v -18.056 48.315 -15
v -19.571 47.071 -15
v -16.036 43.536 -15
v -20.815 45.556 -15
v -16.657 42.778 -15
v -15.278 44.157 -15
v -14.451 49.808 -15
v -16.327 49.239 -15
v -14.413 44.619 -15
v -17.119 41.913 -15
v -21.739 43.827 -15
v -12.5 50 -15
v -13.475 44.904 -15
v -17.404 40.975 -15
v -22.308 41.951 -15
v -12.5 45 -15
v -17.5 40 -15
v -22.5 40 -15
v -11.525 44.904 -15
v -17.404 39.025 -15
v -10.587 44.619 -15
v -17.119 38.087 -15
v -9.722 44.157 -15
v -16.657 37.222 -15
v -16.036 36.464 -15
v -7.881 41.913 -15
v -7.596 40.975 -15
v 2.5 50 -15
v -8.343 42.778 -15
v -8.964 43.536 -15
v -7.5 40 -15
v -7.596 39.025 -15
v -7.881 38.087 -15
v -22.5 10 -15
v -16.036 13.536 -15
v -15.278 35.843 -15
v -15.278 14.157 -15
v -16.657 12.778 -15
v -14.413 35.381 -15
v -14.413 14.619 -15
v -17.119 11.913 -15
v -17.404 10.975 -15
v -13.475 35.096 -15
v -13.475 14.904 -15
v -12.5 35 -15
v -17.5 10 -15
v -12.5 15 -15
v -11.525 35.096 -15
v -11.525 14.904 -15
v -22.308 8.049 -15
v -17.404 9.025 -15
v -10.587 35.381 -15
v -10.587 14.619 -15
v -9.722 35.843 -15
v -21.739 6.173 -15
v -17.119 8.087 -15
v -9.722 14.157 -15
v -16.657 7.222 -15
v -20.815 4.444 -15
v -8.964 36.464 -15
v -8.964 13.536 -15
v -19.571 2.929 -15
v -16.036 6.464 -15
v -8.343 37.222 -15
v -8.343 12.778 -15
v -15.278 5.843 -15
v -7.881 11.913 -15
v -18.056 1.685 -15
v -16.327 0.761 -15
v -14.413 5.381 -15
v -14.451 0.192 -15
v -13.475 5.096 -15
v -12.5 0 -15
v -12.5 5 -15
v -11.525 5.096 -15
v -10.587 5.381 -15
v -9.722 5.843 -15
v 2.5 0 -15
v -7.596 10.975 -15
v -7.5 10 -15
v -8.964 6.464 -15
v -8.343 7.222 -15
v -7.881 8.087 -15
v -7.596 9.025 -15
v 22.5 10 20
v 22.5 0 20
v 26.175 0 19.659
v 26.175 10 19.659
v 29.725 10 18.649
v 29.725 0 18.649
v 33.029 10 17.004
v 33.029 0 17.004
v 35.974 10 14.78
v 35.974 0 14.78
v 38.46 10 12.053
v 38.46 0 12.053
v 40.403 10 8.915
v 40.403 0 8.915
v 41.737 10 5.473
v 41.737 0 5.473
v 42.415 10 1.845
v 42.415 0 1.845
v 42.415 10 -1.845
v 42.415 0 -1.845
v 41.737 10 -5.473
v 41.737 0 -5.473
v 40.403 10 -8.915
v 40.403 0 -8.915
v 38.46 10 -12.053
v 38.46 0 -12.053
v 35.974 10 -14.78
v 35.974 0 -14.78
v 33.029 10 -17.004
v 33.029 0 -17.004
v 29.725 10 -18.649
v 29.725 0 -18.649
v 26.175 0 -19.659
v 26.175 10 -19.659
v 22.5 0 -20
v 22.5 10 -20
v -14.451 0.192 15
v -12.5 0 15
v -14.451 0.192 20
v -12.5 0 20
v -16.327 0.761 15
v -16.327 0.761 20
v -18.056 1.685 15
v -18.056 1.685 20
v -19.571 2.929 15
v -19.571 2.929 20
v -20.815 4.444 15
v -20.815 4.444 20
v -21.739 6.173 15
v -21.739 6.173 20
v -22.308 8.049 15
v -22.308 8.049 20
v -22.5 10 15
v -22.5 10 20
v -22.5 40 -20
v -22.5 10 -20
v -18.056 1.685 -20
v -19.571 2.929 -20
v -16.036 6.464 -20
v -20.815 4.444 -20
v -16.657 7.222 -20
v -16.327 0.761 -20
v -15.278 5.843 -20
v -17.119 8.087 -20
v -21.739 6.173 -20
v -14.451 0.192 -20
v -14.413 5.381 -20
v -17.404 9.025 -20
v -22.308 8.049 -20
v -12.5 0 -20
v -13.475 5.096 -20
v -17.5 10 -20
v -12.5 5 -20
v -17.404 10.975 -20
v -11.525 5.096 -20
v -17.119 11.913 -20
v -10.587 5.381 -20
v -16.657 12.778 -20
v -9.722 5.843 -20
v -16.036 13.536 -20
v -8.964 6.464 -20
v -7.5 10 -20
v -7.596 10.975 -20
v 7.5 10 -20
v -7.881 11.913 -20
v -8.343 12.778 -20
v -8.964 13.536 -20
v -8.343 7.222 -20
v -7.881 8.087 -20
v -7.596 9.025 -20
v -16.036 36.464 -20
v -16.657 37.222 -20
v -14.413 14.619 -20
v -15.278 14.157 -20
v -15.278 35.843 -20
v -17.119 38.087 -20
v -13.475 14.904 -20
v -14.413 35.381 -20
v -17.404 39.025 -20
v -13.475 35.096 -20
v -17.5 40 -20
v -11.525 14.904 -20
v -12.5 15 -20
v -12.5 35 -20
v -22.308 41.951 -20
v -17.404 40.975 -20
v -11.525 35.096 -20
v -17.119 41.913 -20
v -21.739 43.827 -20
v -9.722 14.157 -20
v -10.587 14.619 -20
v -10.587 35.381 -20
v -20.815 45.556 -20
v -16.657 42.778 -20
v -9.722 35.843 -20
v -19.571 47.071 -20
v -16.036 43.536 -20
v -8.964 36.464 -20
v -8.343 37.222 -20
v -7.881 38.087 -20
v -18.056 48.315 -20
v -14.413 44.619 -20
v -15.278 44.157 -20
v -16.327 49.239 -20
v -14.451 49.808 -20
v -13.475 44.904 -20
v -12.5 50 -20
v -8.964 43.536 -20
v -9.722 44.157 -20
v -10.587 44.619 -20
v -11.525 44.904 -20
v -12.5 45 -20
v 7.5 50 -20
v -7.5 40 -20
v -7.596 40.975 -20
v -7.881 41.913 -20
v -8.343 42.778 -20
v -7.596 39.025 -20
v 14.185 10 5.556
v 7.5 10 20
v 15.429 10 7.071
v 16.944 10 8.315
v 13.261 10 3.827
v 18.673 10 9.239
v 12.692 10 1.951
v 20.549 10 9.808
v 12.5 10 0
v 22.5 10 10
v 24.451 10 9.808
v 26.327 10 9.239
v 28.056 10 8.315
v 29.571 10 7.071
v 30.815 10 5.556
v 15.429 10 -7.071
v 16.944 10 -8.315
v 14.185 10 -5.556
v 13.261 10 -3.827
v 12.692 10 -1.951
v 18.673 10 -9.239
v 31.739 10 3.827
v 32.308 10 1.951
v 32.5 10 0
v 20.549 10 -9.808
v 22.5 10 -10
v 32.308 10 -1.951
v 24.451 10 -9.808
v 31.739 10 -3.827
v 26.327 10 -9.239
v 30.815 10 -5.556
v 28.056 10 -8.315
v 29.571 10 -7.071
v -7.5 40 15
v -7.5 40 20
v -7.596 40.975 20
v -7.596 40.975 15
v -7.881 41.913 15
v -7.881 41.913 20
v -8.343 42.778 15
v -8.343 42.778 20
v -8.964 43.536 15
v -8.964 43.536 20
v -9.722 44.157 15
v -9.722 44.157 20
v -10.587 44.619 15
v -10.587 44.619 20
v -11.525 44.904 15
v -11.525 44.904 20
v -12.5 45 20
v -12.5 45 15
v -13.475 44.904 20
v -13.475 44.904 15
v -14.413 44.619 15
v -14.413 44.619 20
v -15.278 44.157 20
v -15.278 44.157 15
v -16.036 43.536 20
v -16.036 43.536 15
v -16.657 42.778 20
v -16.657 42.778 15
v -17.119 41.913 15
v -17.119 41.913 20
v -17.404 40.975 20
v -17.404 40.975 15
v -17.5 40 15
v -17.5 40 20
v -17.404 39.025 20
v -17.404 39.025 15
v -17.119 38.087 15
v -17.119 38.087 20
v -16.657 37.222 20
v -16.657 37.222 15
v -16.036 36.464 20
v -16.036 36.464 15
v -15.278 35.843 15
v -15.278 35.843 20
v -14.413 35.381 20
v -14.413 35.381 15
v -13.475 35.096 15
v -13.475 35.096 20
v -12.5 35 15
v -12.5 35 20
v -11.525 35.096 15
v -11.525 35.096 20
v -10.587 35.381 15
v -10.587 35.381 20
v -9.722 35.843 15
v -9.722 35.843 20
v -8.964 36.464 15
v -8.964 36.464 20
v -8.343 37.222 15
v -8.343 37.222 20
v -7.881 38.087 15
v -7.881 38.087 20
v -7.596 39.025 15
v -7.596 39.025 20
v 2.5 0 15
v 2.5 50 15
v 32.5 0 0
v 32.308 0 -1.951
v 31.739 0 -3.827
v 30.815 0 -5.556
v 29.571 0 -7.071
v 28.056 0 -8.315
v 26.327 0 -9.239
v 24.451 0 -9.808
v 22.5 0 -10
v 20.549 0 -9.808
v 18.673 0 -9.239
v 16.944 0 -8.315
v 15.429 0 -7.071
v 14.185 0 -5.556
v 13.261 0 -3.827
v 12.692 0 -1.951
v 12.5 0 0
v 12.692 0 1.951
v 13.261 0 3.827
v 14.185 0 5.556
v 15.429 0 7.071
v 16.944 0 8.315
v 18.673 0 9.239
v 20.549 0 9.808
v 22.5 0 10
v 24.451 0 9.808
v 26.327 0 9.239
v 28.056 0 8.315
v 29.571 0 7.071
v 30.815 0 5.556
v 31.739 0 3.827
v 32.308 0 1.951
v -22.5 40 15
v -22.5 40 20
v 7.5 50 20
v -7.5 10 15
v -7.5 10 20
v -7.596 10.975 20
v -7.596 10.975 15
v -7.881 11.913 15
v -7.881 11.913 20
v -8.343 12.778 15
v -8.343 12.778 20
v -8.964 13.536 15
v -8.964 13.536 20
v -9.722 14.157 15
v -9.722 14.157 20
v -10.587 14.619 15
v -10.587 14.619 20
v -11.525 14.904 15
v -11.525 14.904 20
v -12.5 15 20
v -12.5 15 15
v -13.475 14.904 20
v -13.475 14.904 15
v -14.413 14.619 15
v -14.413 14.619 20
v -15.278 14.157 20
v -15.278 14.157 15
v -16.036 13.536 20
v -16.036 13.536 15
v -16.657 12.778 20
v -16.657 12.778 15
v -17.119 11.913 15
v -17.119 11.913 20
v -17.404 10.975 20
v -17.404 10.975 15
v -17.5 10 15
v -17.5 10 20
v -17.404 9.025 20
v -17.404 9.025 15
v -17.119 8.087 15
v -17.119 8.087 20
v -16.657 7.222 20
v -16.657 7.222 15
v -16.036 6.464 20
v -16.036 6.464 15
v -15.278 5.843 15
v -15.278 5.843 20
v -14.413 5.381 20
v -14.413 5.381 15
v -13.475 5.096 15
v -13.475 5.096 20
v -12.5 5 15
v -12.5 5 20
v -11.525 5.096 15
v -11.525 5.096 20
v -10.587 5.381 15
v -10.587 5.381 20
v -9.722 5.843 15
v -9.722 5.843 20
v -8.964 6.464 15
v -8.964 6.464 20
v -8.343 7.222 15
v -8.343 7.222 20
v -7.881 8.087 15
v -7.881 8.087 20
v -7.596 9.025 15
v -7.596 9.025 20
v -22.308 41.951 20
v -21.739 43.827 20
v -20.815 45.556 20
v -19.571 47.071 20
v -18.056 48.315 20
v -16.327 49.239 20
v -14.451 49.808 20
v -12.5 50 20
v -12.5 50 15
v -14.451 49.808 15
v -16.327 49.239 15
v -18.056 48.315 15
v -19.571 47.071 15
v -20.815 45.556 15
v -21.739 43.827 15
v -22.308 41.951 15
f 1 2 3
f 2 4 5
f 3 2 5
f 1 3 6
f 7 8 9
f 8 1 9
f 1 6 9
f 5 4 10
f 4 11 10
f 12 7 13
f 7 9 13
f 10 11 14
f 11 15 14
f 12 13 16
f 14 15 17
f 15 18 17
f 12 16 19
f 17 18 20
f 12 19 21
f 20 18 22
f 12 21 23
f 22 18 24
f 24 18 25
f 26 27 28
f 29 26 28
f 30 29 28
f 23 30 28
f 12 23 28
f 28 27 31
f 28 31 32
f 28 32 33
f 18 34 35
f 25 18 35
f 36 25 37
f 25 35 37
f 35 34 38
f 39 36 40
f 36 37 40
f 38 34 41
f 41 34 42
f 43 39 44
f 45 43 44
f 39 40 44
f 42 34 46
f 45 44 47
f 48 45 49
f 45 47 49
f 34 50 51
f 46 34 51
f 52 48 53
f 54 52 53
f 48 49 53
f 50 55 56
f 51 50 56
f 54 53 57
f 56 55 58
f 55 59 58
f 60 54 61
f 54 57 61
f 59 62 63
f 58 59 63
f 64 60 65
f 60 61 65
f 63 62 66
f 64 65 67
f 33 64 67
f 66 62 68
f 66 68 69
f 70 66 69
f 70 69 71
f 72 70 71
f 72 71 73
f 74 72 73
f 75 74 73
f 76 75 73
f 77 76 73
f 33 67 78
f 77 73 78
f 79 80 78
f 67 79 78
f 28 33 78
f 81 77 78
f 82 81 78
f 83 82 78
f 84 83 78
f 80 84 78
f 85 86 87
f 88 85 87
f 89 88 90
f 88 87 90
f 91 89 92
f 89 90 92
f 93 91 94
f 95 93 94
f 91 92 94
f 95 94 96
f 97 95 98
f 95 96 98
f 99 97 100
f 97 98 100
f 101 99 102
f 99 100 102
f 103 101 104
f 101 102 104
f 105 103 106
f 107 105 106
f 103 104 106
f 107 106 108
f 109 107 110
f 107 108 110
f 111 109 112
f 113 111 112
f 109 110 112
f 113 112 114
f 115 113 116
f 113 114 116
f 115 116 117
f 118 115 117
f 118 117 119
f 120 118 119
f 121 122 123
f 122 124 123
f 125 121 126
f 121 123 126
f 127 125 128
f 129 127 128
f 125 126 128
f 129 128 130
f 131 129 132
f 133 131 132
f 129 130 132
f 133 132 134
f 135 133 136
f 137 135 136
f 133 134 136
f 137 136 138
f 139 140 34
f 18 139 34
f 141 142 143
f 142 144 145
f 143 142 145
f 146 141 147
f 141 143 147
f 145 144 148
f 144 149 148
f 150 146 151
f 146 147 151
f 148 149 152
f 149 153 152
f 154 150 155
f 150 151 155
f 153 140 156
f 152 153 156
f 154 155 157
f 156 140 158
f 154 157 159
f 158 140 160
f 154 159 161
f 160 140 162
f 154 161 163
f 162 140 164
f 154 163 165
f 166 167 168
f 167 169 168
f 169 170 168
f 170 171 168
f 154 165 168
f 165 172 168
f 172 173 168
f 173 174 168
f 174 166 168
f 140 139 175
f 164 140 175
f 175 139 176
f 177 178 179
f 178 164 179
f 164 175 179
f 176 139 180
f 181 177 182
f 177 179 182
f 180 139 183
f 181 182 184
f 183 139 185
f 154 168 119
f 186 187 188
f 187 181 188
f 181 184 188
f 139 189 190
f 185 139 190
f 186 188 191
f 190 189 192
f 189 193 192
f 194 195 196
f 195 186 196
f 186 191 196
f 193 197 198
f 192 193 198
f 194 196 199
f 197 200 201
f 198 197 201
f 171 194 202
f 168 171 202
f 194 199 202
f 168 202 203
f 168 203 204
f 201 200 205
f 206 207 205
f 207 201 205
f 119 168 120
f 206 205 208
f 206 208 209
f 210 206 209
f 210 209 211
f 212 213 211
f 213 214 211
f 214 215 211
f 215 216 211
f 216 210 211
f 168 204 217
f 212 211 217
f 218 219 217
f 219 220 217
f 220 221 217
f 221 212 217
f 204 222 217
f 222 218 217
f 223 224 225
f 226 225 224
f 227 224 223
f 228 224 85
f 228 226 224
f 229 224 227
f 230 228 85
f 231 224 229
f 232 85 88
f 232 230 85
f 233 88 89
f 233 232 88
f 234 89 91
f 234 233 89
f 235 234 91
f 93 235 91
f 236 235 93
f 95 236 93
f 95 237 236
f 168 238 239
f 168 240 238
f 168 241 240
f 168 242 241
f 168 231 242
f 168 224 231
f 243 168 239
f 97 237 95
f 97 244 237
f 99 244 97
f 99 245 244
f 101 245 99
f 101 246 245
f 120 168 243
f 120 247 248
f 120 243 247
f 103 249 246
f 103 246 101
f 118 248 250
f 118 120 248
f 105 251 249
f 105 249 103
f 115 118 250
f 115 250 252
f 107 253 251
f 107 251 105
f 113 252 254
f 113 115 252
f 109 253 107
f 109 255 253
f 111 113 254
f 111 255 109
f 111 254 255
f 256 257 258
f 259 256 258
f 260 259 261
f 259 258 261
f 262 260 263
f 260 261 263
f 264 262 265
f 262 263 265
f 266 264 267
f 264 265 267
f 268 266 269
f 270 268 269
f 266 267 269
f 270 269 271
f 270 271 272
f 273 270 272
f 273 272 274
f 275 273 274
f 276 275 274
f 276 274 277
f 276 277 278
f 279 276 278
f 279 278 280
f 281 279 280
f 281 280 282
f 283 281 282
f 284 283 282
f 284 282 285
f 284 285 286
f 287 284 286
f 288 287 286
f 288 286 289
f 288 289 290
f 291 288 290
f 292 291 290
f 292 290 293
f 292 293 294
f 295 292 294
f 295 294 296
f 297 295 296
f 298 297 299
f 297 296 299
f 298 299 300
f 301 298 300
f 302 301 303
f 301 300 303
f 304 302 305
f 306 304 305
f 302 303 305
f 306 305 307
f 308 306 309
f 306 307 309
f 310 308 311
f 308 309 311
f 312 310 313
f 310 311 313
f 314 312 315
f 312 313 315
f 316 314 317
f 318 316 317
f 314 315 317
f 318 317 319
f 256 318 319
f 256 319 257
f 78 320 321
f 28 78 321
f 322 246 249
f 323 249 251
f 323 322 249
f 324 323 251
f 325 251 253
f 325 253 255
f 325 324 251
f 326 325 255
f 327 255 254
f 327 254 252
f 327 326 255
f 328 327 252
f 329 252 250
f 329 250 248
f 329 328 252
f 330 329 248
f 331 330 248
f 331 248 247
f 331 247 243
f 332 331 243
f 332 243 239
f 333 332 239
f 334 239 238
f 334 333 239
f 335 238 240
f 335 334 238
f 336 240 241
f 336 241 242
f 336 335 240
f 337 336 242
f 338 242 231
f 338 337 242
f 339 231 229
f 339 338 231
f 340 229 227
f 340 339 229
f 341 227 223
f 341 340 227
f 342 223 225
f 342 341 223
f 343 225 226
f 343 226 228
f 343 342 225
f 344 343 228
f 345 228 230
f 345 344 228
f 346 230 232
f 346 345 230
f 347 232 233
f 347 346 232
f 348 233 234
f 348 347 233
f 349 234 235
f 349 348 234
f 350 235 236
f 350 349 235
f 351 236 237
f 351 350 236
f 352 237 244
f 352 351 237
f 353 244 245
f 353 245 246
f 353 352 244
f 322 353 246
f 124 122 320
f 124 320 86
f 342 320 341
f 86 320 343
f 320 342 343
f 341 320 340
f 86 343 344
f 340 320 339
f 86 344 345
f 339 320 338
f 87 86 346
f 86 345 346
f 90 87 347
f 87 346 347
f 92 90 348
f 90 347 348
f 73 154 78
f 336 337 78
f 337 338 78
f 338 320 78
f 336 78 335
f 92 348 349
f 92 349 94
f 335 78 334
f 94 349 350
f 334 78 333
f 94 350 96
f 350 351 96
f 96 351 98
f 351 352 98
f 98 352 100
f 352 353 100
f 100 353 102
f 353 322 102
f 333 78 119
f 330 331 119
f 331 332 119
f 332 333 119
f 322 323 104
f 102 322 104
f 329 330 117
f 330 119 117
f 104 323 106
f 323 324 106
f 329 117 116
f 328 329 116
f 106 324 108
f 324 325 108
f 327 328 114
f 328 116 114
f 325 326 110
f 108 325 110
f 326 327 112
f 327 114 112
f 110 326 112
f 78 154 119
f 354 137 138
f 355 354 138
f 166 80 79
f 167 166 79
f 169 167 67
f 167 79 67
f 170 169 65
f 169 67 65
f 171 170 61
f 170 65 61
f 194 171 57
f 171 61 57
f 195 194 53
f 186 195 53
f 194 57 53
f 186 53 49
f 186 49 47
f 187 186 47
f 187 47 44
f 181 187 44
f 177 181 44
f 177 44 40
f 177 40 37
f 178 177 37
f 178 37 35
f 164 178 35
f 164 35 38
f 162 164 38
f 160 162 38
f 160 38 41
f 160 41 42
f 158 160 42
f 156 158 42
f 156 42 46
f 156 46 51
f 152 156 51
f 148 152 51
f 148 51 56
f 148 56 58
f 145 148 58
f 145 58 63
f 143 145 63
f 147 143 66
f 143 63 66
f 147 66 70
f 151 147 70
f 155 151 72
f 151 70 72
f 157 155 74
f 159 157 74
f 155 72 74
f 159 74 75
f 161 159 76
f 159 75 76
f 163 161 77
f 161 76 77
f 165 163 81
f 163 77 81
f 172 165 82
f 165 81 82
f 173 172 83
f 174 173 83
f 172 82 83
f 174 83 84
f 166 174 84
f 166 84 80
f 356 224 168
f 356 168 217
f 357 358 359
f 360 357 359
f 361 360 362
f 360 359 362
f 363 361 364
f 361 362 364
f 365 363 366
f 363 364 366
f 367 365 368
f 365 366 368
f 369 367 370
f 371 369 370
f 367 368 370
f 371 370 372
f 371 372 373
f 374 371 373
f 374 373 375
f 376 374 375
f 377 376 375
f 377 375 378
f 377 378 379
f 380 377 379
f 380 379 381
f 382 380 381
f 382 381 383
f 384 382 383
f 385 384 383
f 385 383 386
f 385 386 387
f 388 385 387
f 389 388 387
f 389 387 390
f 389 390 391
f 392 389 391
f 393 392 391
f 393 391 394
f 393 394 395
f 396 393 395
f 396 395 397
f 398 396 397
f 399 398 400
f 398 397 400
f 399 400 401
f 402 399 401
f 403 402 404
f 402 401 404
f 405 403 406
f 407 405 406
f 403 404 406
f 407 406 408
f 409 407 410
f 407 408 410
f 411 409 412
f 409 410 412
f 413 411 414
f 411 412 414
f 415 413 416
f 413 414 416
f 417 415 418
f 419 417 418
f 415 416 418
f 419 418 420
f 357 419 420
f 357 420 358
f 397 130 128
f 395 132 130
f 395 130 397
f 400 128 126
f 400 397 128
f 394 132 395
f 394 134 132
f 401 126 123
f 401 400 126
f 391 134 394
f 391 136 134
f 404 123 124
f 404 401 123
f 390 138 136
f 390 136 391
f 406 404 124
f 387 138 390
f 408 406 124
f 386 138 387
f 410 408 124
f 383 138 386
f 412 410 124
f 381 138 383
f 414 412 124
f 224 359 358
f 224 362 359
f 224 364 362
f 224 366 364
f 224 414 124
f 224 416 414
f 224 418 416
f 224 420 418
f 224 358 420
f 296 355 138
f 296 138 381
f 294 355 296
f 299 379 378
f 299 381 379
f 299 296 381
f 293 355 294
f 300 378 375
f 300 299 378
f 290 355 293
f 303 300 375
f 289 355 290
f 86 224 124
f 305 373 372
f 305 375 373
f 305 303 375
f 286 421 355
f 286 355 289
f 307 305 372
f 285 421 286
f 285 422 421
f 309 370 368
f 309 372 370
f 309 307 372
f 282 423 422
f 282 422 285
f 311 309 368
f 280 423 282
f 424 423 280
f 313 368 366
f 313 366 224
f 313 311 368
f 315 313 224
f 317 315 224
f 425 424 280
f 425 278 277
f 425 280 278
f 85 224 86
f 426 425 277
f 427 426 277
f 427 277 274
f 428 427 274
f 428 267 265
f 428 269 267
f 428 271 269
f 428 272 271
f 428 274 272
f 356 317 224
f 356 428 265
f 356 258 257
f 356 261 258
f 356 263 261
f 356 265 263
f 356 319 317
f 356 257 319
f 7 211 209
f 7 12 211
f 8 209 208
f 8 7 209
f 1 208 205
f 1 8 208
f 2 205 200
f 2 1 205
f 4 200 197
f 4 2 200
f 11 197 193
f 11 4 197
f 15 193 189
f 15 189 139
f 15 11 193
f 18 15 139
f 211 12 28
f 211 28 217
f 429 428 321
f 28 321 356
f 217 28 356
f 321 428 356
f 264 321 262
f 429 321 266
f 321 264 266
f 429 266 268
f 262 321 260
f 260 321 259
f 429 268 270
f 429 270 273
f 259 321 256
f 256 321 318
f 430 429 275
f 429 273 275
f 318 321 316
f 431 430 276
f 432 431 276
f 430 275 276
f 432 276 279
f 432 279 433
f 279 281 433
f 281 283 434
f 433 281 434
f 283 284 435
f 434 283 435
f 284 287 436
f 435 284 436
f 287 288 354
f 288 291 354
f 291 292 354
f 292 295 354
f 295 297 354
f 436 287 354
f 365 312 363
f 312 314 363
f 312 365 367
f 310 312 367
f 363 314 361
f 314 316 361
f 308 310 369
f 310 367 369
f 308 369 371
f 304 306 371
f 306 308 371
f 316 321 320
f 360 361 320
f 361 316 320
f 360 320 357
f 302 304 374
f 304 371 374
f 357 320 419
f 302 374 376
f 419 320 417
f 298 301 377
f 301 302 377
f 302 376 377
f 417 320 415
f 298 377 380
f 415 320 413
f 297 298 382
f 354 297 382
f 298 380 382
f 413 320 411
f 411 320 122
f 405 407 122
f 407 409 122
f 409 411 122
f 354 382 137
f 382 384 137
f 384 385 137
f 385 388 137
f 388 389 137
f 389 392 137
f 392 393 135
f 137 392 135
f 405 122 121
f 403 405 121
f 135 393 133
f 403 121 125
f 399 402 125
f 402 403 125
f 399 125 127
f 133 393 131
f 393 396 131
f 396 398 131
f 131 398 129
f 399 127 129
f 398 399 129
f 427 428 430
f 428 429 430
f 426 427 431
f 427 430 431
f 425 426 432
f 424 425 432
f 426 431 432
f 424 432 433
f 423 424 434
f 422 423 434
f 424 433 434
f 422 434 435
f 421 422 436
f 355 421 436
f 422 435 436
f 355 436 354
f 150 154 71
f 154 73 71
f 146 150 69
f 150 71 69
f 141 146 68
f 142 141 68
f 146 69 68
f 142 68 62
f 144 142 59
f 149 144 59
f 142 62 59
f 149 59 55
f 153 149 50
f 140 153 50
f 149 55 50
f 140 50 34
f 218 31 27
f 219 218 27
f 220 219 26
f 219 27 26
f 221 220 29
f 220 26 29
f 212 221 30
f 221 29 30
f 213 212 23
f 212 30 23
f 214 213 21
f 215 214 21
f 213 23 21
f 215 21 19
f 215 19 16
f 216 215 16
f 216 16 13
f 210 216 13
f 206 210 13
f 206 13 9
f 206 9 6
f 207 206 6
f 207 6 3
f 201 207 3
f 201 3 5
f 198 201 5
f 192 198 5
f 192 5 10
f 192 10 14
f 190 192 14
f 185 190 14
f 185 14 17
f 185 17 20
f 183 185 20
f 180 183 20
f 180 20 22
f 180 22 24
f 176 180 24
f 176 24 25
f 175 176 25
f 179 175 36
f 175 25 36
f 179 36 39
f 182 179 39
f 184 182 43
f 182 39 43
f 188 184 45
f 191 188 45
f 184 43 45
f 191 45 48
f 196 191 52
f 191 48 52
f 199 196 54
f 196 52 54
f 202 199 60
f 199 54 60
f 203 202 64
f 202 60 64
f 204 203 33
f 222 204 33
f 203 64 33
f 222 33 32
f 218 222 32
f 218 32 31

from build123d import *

# Parameters (mm, degrees)
SKETCH1_R               = 10
BOSS_EXTRUDE1_DEPTH     = 10
SKETCH2_W               = 25
SKETCH2_H               = 50
BOSS_EXTRUDE2_DEPTH     = 5
SKETCH3_W               = 25
SKETCH3_H               = 50
BOSS_EXTRUDE3_DEPTH     = 5
SKETCH4_W               = 5
SKETCH4_H               = 40
BOSS_EXTRUDE4_DEPTH     = 40
SKETCH5_R               = 5
CUT_EXTRUDE1_DEPTH      = 1
CUT_EXTRUDE1_DEPTH_BACK = 41
FILLET1_R               = 10


with BuildPart() as part:
    # Sketch1 → Boss-Extrude1 (new body)
    with BuildSketch(Plane(origin=(0, 0, 0), x_dir=(1, 0, 0), z_dir=(0, 1, 0))):
        with BuildLine():
            Line((-22.5, 15), (2.5, 15))
            Line((2.5, 15), (2.5, -15))
            Line((2.5, -15), (-22.5, -15))
            Line((-22.5, -15), (-22.5, -20))
            Line((-22.5, -20), (22.5, -20))
            ThreePointArc((22.5, -20), (42.5, 0), (22.5, 20))
            Line((22.5, 20), (-22.5, 20))
            Line((-22.5, 20), (-22.5, 15))
        make_face()
        with Locations((22.5, 0)):
            Circle(SKETCH1_R, mode=Mode.SUBTRACT)
    extrude(amount=BOSS_EXTRUDE1_DEPTH)

    # Sketch2 → Boss-Extrude2 (add)
    with BuildSketch(Plane(origin=(0, 0, -20), x_dir=(-1, 0, 0), z_dir=(0, 0, -1))):
        with Locations((10, 25)):
            Rectangle(SKETCH2_W, SKETCH2_H)
    extrude(amount=-BOSS_EXTRUDE2_DEPTH)

    # Sketch3 → Boss-Extrude3 (add)
    with BuildSketch(Plane.XY.offset(20)):
        with Locations((-10, 25)):
            Rectangle(SKETCH3_W, SKETCH3_H)
    extrude(amount=-BOSS_EXTRUDE3_DEPTH)

    # Sketch4 → Boss-Extrude4 (add)
    with BuildSketch(Plane.XY.offset(20)):
        with Locations((5, 30)):
            Rectangle(SKETCH4_W, SKETCH4_H)
    extrude(amount=-BOSS_EXTRUDE4_DEPTH)

    # Sketch5 → Cut-Extrude1 (cut, two sides)
    with BuildSketch(Plane.XY.offset(20)) as cut_extrude1_sk:
        with Locations((-12.5, 40)):
            Circle(SKETCH5_R)
        with Locations((-12.5, 10)):
            Circle(SKETCH5_R)
    extrude(amount=CUT_EXTRUDE1_DEPTH, mode=Mode.SUBTRACT)
    extrude(cut_extrude1_sk.sketch, amount=-CUT_EXTRUDE1_DEPTH_BACK, mode=Mode.SUBTRACT)

    # Fillet1
    fillet1_edges = [part.edges().sort_by_distance(p)[0] for p in [
        (-22.5, 0, -17.5),
        (-22.5, 50, -17.5),
        (-22.5, 50, 17.5),
        (-22.5, 0, 17.5),
    ]]
    fillet(fillet1_edges, radius=FILLET1_R)


solid = part.part
